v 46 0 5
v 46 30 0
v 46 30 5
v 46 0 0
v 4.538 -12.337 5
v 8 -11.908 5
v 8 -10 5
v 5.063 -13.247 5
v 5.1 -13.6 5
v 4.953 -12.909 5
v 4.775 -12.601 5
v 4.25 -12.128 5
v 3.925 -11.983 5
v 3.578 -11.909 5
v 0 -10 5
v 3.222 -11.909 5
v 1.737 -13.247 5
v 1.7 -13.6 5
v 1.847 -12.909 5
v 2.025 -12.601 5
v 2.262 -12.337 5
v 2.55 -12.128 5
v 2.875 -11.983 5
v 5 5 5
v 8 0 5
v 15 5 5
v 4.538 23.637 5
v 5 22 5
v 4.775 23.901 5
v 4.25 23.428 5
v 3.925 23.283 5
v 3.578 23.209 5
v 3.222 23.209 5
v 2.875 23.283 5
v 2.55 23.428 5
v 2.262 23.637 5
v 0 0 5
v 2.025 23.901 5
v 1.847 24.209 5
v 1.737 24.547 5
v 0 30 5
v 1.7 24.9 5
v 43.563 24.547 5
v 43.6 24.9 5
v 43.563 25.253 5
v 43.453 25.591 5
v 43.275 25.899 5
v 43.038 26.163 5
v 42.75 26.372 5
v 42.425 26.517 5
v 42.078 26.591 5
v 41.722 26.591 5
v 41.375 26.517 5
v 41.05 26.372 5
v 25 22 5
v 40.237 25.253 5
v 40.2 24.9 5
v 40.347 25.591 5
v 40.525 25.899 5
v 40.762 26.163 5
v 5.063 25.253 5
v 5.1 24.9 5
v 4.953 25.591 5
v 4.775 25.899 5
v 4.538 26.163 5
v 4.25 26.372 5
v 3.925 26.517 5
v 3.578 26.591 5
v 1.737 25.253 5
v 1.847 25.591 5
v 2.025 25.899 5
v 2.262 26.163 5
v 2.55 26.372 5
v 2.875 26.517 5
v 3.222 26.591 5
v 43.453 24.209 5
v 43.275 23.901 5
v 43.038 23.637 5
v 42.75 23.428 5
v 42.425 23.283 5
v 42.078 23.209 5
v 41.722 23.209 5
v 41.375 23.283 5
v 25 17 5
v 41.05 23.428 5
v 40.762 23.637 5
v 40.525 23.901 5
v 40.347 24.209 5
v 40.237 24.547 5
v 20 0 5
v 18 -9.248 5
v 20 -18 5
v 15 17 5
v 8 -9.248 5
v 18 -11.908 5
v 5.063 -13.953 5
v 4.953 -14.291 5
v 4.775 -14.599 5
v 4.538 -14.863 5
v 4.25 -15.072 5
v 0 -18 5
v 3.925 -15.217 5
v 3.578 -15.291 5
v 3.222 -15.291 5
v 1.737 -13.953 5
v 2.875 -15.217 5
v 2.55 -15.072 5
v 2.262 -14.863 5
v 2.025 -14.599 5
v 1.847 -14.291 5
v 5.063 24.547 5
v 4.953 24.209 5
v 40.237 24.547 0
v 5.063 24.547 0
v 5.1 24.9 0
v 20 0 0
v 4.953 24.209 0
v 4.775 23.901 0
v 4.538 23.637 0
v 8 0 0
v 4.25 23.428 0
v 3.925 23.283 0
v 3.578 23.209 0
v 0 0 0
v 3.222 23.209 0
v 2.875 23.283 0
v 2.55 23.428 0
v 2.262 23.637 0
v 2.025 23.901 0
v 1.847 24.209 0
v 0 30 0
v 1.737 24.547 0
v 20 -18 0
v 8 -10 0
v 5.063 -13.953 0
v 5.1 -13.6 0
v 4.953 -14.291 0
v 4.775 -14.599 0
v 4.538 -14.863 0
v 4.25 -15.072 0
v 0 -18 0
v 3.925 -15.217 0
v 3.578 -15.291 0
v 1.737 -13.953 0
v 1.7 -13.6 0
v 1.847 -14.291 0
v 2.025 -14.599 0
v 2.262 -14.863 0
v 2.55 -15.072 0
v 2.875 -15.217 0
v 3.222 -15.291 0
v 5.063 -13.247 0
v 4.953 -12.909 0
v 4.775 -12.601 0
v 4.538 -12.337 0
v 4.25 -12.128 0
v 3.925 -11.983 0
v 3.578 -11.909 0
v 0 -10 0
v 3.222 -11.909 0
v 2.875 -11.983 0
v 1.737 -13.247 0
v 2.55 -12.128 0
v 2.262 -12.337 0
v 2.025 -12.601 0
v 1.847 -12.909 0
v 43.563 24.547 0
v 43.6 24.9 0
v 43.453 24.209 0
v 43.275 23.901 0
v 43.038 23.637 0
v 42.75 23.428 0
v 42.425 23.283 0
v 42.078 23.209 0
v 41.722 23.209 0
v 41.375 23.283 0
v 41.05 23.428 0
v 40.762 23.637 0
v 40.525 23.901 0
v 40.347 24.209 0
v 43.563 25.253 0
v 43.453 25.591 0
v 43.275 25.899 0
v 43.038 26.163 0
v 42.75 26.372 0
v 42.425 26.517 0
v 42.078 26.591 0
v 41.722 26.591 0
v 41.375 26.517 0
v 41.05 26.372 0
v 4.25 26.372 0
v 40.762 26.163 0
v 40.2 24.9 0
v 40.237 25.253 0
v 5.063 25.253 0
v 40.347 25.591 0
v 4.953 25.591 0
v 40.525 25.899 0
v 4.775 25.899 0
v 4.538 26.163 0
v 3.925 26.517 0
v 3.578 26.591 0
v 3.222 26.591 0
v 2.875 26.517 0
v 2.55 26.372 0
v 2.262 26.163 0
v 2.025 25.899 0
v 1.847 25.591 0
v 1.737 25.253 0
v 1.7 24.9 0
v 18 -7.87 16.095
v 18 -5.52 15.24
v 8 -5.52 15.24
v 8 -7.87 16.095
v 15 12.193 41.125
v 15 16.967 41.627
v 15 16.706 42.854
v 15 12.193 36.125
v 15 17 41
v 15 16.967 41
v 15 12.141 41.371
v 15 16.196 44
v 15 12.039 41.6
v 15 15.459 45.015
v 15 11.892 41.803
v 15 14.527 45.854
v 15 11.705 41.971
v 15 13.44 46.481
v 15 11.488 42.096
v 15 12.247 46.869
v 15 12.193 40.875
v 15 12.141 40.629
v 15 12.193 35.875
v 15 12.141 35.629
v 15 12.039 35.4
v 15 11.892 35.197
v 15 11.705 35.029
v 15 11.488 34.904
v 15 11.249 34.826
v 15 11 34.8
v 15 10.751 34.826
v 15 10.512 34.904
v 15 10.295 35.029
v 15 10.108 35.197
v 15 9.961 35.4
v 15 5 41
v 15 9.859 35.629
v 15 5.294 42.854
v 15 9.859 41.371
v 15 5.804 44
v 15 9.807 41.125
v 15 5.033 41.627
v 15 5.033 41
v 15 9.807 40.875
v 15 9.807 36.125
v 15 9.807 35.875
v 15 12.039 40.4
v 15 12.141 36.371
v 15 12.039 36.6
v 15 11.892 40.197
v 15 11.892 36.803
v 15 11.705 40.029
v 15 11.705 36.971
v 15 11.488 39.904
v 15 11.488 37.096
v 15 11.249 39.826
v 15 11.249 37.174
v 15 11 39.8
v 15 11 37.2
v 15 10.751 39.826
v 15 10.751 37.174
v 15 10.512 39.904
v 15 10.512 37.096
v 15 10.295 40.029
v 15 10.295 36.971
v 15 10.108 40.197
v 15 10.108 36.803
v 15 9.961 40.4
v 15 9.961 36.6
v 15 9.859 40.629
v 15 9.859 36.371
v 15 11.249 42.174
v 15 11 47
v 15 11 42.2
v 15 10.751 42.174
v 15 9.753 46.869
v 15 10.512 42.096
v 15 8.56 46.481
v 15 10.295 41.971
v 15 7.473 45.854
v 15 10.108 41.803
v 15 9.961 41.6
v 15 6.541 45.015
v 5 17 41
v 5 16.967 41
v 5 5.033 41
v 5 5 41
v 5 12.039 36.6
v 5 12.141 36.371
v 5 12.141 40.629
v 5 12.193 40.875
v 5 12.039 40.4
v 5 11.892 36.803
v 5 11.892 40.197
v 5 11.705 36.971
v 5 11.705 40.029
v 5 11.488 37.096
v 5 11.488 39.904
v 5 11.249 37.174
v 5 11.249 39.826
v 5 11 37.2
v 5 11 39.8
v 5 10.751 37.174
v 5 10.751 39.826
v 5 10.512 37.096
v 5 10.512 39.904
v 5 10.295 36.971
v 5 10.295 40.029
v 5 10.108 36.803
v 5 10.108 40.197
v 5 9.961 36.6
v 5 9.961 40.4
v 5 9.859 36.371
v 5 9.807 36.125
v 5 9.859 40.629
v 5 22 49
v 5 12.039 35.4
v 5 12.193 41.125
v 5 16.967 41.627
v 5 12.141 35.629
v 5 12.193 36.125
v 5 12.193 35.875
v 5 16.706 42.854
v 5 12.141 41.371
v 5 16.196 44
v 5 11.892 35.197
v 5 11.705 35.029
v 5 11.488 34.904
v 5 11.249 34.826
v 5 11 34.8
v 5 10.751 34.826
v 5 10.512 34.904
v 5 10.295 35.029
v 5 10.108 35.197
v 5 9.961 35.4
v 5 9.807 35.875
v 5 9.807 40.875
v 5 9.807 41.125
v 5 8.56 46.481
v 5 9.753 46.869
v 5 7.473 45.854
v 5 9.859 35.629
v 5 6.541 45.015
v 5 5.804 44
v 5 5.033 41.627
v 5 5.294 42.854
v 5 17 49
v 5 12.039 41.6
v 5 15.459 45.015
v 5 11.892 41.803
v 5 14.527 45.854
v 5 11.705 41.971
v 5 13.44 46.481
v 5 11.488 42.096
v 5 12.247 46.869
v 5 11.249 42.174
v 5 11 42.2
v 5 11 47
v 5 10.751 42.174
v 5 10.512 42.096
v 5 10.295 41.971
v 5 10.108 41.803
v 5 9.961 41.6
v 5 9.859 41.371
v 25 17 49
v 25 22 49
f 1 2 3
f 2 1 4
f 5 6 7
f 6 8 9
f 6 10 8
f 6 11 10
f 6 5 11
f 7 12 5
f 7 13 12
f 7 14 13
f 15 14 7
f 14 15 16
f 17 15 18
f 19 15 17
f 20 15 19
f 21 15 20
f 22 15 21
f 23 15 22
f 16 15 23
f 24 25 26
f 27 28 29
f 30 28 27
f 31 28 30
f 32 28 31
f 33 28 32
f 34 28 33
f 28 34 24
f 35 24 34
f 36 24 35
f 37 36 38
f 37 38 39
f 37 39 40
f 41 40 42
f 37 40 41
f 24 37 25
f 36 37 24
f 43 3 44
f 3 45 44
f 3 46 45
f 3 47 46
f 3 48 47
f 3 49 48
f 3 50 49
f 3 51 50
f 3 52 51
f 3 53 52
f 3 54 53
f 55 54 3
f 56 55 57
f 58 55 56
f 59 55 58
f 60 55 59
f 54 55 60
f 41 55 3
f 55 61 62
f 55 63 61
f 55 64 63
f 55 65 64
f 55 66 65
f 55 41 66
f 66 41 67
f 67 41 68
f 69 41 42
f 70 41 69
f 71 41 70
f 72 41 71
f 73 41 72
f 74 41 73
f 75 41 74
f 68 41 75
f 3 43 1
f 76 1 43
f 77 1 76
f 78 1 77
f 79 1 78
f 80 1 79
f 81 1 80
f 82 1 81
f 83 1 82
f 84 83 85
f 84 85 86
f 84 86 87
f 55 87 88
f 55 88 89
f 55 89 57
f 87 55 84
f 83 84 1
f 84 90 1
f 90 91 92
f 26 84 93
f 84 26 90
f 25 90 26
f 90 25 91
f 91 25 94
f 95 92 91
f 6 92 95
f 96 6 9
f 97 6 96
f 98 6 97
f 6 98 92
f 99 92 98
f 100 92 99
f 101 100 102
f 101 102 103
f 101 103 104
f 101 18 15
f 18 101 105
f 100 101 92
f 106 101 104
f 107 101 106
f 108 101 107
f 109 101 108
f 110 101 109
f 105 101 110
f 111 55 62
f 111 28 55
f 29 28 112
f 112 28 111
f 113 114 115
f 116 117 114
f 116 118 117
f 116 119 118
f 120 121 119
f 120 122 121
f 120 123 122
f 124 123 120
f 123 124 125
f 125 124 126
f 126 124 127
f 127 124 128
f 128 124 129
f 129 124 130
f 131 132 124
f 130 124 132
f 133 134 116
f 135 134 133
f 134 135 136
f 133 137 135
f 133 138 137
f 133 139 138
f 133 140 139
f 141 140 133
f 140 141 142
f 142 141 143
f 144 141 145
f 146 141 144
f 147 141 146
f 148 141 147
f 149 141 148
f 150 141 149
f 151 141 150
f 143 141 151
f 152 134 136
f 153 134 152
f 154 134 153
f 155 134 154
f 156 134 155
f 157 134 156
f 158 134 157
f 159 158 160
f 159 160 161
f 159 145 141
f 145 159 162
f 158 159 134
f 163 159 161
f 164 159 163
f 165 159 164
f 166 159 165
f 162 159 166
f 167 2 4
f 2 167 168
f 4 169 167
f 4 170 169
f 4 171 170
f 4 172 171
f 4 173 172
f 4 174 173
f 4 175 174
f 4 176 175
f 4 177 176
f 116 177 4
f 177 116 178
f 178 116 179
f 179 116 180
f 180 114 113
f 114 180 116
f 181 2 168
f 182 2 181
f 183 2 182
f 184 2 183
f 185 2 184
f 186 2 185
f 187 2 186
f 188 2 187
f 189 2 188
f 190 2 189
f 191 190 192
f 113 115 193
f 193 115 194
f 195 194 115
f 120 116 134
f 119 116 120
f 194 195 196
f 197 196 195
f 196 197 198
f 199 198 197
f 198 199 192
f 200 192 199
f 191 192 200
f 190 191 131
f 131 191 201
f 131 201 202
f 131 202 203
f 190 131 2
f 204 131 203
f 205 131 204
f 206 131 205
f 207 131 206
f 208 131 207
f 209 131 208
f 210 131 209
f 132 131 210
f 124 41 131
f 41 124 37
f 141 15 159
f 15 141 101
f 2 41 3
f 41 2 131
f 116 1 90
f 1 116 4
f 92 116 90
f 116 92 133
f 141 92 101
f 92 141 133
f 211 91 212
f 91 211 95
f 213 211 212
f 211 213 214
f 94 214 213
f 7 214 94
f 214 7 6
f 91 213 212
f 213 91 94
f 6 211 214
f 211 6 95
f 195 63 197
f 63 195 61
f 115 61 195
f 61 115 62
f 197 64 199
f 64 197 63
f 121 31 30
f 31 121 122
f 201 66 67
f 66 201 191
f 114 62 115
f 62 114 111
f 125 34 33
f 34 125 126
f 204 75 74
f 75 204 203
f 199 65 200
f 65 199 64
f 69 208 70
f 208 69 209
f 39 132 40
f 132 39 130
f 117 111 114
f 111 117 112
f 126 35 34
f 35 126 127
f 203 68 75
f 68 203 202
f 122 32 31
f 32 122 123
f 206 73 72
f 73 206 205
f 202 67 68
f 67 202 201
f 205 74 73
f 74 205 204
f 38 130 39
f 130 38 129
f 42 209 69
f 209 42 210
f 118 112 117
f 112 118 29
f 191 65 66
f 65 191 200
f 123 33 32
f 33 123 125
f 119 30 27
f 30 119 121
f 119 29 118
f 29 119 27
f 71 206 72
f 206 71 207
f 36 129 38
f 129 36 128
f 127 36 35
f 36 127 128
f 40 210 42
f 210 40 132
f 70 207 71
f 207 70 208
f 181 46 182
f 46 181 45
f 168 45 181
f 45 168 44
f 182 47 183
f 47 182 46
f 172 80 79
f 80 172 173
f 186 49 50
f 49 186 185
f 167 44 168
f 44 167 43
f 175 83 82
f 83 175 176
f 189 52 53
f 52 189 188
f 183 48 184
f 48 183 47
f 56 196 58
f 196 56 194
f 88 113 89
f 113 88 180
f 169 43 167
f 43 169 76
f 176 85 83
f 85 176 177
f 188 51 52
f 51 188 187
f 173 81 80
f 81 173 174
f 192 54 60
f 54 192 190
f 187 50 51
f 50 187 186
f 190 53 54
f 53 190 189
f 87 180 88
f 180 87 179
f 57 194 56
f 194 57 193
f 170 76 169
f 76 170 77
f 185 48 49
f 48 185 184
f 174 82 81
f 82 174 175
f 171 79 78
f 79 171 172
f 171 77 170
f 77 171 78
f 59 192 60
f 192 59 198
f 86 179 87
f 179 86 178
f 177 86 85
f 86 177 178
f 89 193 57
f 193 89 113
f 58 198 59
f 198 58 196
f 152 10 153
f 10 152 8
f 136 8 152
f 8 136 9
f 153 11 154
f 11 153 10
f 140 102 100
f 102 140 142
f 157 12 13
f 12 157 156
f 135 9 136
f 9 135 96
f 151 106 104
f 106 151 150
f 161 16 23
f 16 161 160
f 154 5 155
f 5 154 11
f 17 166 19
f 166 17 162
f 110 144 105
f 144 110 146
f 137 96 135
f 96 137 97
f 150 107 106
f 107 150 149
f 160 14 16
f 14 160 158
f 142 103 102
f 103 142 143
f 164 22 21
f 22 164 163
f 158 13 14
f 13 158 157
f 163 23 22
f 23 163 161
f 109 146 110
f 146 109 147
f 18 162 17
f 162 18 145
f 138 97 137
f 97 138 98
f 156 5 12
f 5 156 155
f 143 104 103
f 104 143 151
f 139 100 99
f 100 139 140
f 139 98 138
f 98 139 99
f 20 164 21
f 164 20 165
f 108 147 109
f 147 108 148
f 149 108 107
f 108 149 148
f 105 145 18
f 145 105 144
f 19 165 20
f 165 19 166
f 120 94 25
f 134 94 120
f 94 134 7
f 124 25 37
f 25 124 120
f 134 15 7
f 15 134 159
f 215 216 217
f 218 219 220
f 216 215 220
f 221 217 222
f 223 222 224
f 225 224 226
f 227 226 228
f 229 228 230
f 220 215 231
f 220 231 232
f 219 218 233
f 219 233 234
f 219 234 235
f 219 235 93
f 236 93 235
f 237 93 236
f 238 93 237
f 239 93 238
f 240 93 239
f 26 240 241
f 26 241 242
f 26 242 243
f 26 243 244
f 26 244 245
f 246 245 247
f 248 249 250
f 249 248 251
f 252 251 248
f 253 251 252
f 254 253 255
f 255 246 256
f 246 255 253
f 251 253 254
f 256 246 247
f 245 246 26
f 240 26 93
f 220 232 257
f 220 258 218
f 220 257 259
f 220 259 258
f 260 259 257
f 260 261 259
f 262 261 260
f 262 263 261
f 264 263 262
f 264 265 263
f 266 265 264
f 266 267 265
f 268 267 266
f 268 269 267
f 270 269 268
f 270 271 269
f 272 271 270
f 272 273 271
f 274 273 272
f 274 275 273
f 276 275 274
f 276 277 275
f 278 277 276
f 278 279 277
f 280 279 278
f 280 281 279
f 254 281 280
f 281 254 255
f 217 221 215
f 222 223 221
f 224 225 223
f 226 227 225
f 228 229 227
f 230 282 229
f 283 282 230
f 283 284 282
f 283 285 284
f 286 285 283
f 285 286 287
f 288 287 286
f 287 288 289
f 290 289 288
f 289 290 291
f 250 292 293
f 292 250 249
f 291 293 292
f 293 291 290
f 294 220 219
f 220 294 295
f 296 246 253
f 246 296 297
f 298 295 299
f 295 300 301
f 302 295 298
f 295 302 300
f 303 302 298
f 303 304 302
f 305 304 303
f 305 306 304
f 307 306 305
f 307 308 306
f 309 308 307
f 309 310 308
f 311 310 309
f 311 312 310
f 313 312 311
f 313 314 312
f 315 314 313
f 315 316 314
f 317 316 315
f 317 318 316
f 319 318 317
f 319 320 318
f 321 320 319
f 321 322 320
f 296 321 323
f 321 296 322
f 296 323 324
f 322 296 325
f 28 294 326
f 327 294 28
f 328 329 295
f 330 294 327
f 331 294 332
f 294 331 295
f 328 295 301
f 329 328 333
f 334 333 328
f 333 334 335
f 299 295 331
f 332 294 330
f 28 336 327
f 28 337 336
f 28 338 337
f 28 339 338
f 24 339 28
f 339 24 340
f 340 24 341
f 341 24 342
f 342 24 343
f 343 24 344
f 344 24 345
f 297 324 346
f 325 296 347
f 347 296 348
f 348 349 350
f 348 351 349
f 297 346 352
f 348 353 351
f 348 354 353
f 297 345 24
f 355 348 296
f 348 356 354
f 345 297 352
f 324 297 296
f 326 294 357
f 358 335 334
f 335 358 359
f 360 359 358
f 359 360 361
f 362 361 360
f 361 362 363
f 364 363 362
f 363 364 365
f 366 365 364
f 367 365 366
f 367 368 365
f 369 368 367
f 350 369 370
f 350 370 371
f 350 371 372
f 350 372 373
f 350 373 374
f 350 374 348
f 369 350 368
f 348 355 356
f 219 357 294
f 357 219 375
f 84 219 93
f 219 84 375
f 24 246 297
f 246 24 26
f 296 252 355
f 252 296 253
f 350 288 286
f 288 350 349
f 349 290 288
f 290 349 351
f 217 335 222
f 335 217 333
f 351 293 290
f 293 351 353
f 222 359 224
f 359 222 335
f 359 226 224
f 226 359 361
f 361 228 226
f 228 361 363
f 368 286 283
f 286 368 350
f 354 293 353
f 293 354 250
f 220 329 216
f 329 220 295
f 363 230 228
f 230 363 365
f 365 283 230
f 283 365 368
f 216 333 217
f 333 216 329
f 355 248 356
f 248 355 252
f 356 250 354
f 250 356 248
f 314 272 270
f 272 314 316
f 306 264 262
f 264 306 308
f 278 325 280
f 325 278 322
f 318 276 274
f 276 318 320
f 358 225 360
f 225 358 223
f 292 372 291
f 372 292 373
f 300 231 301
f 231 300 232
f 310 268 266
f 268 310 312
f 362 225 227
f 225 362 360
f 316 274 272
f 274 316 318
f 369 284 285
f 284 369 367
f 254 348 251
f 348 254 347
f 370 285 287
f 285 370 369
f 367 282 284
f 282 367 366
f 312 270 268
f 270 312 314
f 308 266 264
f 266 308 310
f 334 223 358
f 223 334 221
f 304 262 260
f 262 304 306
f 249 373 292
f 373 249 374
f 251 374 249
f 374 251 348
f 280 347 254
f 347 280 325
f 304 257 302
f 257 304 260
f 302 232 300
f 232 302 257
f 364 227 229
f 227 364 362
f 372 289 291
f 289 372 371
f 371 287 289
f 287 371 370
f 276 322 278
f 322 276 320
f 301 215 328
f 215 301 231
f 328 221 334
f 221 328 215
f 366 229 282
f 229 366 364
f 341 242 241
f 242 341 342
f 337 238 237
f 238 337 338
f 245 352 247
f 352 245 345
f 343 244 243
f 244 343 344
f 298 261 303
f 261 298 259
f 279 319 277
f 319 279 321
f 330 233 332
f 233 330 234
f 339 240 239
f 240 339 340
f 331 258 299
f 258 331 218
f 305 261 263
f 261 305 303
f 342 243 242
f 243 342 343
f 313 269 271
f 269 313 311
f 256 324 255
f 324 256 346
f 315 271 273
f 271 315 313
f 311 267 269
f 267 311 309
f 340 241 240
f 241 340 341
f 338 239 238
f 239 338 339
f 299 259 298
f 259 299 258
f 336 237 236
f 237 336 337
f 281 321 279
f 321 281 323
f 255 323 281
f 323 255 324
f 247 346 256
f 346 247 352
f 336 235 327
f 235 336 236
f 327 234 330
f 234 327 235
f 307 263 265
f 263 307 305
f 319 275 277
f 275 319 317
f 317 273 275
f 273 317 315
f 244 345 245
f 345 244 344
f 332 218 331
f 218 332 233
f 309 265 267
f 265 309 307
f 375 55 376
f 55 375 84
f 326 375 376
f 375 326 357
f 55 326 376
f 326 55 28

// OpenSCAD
// Cooling Fan Bracket
$fs = 0.2;		// Circle edges 


fan_length = 46;
fan_width = 30;
// fan_width = 30;


wall_thickness = 5;
pillar_width=12.0;
pillar_length=10.0;
pillar_height=41.0;

fan_dist = 38.5;  // gap between fan mount posts
pillar_distx = 5; // distance from left side to pillar left side
pillar_disty = 5; // distance from front side to pillar front side


m4_bolt = 2.2;
m3_bolt = 1.7;
m25_bolt = 1.2;


difference()
	{
	union()
		{
		cube(size=[fan_length, fan_width, wall_thickness] );
	
		translate(v=[0,-18,0] )
			cube(size=[20,30, wall_thickness]);

		// Cable guide
		translate(v=[8,-13,2] )
			rotate(a=[-20,0,0])
				cube(size=[10, wall_thickness/2, 15]);
		
		}

	translate(v=[m3_bolt * 2, fan_width - m3_bolt * 3, 0 ] )
		cylinder(r=m3_bolt, h=wall_thickness );
	translate(v=[m3_bolt * 2 + fan_dist, fan_width - m3_bolt * 3, 0 ] )
		cylinder(r=m3_bolt, h=wall_thickness );

	translate(v=[m3_bolt * 2, fan_width - m3_bolt * 3 - fan_dist, 0 ] )
		cylinder(r=m3_bolt, h=wall_thickness );

	translate(v=[0,-10,0] )
			cube(size=[8,10, wall_thickness]);

	}



translate(v=[pillar_distx, pillar_disty,0 ] )
	bracket();

translate(v=[pillar_distx, pillar_disty + pillar_width,0 ] )
	cube(size=[20, 5, pillar_height+8] );




module bracket()
	{
	difference()
		{
		union()
			{
			cube( size=[pillar_length, pillar_width, pillar_height] );
	
			translate(v=[0, pillar_width/2, pillar_height] )
				rotate( a=[0,90,0] )
					cylinder(r=pillar_width/2, h=pillar_length);
			}
			translate(v=[0, pillar_width/2, pillar_height] )
				rotate( a=[0,90,0] )
					cylinder(r=m25_bolt, h=pillar_length);

			translate(v=[0, pillar_width/2, pillar_height-5] )
				rotate( a=[0,90,0] )
					cylinder(r=m25_bolt, h=pillar_length);

		}
}
